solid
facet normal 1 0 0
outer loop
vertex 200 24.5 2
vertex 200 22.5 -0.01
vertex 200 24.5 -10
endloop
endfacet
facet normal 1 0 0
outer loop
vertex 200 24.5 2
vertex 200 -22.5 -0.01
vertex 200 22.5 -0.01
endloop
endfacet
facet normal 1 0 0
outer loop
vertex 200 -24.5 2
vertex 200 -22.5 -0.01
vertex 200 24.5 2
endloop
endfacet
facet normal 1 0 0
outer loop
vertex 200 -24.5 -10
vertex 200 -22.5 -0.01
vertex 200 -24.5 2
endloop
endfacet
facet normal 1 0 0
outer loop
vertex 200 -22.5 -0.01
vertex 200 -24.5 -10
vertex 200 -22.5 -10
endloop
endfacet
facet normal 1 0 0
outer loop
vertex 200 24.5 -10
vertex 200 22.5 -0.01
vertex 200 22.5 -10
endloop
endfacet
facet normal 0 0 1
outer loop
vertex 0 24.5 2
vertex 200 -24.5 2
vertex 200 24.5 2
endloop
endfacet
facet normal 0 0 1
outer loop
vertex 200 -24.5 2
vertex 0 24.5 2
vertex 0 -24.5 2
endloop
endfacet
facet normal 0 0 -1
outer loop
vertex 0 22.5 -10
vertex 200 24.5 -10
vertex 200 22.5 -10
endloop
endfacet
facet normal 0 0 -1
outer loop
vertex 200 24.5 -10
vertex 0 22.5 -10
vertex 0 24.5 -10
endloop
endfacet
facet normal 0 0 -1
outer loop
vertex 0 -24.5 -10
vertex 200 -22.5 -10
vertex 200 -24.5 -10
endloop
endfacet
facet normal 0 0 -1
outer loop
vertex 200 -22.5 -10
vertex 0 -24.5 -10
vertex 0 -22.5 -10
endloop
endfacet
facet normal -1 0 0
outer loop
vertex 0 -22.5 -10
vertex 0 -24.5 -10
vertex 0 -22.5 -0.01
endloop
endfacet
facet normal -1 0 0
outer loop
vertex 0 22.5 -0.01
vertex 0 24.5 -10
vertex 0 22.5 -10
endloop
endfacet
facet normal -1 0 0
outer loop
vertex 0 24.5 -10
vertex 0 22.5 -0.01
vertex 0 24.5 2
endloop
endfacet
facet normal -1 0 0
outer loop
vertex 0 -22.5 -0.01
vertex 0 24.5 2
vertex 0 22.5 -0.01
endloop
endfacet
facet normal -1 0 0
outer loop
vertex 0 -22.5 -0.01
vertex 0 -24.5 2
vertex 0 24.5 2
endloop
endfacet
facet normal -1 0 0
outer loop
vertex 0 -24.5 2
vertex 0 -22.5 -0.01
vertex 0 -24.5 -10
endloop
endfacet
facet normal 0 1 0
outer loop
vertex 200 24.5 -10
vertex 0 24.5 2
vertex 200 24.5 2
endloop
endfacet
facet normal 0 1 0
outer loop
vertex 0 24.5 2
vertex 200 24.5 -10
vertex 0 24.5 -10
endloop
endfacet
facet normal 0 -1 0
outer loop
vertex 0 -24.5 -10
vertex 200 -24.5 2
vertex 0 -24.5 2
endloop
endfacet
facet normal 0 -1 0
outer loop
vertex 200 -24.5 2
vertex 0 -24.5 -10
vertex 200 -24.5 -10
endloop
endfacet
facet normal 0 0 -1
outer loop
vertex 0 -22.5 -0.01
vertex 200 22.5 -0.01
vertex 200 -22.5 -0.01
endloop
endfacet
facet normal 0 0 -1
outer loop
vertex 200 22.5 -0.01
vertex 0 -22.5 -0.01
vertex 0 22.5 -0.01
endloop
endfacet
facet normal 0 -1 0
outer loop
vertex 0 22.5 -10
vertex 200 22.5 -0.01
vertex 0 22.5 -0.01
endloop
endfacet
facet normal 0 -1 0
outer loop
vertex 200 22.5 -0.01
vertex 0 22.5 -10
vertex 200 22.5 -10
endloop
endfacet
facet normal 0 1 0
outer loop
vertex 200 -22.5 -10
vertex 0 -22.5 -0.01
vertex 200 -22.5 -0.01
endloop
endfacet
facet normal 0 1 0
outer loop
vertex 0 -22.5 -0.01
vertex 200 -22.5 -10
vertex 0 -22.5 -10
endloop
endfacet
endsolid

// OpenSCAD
$fn = 200;

// fudge to prevent z-fighting on preview
f = 0.01;

module guide(l=200) {
    h = 45;
    t = 2;
    d = 10;

    translate([0,-h/2-t,-d]) difference() {
        cube([l,h+t*2,d+t]);
        translate([-f,t,0-f]) cube([l+2*f,h,d]);
    }
}

guide();
